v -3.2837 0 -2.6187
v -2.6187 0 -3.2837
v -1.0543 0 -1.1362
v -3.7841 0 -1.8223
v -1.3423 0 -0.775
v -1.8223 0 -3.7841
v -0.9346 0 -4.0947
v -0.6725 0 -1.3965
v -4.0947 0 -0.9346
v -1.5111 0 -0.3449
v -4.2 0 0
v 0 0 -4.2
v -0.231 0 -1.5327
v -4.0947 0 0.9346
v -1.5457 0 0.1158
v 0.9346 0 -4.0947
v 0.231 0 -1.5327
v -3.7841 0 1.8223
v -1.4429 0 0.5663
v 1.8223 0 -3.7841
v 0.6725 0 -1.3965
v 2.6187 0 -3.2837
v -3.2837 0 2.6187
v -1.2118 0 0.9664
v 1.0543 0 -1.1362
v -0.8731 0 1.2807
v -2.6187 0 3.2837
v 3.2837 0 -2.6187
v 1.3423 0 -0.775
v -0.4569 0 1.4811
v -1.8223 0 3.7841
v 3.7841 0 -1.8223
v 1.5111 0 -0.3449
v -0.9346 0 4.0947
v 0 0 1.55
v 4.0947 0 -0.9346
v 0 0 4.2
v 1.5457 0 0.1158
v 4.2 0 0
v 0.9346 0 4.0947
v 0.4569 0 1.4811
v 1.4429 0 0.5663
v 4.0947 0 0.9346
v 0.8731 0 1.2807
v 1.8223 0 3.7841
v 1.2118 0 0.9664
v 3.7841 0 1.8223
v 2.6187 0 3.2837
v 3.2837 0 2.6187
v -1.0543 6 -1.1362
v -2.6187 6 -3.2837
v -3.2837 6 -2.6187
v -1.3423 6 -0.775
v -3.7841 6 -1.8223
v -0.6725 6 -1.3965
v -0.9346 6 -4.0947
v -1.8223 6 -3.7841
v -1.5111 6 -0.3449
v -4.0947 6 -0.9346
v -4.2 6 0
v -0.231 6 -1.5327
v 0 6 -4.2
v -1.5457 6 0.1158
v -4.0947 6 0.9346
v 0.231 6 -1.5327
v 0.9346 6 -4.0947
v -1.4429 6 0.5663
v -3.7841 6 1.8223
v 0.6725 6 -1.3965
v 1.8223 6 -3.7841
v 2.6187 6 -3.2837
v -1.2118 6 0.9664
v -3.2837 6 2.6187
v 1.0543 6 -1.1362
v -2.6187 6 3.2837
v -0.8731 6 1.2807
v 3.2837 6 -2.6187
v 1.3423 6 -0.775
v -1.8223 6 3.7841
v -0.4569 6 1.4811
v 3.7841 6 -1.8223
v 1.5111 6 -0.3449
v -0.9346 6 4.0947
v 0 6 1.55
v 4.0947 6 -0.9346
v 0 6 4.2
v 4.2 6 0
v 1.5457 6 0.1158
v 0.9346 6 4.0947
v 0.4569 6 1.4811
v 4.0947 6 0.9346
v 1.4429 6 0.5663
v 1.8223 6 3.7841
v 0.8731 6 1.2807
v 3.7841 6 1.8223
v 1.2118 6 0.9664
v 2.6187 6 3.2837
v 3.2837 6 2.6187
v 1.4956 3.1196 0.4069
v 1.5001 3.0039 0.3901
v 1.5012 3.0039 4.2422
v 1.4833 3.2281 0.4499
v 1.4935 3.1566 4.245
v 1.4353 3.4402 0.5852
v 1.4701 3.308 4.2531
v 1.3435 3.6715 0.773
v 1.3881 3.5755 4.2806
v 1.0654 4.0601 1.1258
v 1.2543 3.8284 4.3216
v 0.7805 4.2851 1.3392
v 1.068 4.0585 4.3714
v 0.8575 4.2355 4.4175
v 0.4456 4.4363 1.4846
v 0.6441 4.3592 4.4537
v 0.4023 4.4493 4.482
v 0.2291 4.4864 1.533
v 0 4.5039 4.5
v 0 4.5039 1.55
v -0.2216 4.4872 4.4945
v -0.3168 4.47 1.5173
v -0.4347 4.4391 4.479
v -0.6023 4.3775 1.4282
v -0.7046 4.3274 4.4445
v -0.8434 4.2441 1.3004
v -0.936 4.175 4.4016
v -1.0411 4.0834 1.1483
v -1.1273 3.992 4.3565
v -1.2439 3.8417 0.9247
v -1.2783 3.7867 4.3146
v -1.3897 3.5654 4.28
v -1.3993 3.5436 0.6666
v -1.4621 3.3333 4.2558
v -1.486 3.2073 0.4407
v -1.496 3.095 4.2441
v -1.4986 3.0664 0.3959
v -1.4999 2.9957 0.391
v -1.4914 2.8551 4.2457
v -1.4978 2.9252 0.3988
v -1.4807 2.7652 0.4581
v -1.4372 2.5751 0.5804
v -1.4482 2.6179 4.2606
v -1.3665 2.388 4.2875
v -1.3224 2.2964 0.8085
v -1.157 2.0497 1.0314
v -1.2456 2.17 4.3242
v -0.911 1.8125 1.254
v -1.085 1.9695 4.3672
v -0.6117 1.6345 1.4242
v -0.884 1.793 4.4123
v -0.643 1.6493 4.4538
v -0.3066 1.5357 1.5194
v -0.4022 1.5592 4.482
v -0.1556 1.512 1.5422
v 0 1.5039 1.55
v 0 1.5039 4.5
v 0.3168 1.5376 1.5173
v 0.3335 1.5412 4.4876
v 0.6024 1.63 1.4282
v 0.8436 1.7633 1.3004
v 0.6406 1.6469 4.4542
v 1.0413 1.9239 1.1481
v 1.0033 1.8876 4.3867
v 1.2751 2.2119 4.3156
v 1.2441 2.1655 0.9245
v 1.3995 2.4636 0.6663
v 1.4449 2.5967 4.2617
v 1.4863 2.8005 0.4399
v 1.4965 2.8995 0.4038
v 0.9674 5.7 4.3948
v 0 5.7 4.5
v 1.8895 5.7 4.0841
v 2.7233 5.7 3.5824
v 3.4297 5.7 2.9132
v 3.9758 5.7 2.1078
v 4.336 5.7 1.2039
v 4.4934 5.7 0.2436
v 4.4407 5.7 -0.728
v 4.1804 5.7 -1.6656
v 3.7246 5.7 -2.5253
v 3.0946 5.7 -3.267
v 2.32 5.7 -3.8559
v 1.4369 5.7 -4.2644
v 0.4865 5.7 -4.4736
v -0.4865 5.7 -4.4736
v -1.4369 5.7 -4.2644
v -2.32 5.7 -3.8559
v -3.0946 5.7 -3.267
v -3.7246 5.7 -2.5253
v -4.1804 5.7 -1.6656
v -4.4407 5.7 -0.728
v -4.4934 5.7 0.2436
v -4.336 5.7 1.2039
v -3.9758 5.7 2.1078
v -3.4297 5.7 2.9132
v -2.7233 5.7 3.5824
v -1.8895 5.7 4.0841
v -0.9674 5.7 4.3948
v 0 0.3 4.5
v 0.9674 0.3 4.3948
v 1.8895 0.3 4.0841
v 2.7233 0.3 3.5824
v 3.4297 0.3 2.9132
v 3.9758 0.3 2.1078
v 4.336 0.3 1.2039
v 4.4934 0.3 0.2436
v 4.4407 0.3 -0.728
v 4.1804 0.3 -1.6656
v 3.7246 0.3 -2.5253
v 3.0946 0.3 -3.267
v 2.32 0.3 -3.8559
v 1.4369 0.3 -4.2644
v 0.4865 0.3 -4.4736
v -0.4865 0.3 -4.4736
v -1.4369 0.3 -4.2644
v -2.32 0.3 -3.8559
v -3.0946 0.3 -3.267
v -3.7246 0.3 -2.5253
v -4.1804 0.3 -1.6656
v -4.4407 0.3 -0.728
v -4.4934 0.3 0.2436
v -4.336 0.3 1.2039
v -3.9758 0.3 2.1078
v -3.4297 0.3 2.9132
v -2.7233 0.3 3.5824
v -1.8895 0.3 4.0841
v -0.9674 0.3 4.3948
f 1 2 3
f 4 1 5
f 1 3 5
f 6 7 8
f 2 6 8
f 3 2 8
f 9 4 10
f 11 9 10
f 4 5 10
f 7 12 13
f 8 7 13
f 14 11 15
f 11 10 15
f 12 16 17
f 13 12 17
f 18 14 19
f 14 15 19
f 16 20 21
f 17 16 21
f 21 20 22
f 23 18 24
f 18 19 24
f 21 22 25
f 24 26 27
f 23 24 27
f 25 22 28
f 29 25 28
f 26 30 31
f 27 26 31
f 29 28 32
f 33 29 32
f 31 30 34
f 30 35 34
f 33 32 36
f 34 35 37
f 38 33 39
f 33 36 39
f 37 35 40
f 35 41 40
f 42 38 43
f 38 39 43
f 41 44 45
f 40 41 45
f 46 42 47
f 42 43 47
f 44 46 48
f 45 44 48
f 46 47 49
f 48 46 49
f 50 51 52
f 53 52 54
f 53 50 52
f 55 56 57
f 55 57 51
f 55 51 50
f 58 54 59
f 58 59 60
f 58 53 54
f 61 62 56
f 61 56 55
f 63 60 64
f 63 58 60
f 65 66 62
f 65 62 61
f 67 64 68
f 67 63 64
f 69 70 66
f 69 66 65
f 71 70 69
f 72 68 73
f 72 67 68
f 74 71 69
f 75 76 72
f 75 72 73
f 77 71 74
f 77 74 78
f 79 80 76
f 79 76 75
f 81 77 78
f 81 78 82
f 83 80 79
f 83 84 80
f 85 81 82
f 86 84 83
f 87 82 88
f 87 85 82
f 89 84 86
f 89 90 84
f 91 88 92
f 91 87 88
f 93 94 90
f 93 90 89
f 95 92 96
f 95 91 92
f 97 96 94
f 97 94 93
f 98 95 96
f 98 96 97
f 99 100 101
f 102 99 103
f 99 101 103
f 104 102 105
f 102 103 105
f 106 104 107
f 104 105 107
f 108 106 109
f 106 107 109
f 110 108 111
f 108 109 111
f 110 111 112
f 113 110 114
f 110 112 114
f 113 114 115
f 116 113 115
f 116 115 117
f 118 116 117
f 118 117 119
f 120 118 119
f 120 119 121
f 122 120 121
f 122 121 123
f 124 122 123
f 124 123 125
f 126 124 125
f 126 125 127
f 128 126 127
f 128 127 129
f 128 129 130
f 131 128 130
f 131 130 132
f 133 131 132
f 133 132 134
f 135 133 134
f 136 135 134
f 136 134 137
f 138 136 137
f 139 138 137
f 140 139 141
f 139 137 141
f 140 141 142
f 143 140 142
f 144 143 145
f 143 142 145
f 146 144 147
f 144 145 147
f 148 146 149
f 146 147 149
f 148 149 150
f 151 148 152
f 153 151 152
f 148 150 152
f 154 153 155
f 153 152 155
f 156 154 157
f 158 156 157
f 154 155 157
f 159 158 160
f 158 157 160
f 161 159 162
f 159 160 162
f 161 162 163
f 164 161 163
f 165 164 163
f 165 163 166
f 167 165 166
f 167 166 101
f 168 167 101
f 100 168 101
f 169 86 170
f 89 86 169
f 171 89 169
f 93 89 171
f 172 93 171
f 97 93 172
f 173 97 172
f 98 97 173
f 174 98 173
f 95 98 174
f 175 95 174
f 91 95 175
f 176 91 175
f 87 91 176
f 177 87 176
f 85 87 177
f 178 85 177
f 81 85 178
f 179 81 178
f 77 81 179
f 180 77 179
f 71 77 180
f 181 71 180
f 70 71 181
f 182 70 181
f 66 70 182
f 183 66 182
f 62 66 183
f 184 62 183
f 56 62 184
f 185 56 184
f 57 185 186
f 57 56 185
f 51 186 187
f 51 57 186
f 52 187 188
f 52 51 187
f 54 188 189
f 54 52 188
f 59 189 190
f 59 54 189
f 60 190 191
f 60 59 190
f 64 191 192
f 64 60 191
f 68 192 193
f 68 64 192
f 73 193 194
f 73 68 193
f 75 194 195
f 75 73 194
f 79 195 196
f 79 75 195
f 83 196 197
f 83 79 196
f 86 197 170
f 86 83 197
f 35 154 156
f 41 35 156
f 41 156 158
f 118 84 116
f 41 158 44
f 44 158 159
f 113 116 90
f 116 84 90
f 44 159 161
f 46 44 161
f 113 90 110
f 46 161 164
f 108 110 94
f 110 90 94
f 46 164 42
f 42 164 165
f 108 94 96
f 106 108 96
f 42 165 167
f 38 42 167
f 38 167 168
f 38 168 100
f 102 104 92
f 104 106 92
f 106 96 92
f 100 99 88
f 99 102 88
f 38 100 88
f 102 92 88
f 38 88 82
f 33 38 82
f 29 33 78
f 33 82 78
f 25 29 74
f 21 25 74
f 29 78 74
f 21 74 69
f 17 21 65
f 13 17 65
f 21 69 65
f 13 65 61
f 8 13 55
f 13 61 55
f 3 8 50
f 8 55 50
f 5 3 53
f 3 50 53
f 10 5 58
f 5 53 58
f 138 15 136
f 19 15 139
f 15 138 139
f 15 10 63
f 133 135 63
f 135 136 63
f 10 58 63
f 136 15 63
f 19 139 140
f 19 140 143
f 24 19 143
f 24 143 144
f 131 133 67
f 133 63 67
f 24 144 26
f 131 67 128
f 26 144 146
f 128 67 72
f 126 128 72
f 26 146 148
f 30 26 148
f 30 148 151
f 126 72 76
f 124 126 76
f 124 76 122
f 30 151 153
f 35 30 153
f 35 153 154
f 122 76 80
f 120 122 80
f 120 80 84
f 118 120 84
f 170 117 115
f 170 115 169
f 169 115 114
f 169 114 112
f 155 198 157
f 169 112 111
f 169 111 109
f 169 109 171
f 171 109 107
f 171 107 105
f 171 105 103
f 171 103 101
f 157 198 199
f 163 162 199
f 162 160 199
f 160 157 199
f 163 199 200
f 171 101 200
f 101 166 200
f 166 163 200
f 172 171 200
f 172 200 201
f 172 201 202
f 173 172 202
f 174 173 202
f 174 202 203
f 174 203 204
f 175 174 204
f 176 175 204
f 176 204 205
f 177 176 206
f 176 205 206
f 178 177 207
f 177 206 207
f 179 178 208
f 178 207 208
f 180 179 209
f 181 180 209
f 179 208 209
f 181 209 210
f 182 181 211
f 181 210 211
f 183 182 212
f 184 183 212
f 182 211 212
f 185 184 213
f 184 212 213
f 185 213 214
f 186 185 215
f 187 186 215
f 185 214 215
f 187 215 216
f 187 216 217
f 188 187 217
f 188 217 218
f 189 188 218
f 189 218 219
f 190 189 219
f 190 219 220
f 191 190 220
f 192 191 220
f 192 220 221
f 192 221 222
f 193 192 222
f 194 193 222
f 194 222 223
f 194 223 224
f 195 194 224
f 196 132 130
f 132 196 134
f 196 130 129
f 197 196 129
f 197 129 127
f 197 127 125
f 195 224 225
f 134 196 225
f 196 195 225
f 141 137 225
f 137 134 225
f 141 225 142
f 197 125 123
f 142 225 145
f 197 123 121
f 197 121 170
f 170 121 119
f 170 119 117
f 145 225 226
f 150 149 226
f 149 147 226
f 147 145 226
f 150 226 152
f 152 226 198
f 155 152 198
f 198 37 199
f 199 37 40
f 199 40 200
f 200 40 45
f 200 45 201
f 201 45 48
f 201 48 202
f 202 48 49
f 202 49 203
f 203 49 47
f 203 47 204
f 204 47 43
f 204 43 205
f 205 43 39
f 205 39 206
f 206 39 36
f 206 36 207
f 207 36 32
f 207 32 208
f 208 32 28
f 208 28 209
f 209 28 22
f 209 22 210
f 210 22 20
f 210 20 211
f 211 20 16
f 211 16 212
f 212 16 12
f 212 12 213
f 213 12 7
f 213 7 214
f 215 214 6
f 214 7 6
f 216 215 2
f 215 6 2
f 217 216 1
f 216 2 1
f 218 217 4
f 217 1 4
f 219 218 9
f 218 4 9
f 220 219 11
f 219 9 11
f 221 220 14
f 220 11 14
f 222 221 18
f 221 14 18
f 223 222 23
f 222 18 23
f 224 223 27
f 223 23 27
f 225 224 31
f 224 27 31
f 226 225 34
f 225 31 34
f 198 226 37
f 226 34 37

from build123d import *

# Parameters (mm, degrees)
CROQUIS1_R                                     = 4.5
SALIENTE_EXTRUIR1_DEPTH                        = 6
CHAFL_N1_SIZE                                  = 0.3
CHAFL_N2_SIZE                                  = 0.3
CROQUIS2_R                                     = 1.55
CORTAR_EXTRUIR2_DEPTH                          = 6
PERFORADOR_PARA_ROSCAR_HELICOIL_DE_M2_21_REACH = 12.502
PERFORADOR_PARA_ROSCAR_HELICOIL_DE_M_2_R       = 1.5


with BuildPart() as part:
    # Croquis1 → Saliente-Extruir1 (new body)
    with BuildSketch(Plane(origin=(0, 0, 0), x_dir=(1, 0, 0), z_dir=(0, 1, 0))):
        with Locations(Location((0, 0, 0), (0, 0, 270))):
            Circle(CROQUIS1_R)
    extrude(amount=SALIENTE_EXTRUIR1_DEPTH)

    # Chaflán1
    chafl_n1_edges = [part.edges().sort_by_distance(p)[0] for p in [
        (0, 6, -4.5),
    ]]
    chamfer(chafl_n1_edges, length=CHAFL_N1_SIZE)

    # Chaflán2
    chafl_n2_edges = [part.edges().sort_by_distance(p)[0] for p in [
        (0, 0, -4.5),
    ]]
    chamfer(chafl_n2_edges, length=CHAFL_N2_SIZE)

    # Croquis2 → Cortar-Extruir2 (cut)
    with BuildSketch(Plane(origin=(0, 6, 0), x_dir=(1, 0, 0), z_dir=(0, 1, 0))):
        with Locations(Location((0, 0, 0), (0, 0, 270))):
            Circle(CROQUIS2_R)
    extrude(amount=-CORTAR_EXTRUIR2_DEPTH, mode=Mode.SUBTRACT)

    # Perforador para roscar Helicoil de M 2 (on position points) → Perforador para roscar Helicoil de M2.21 (cut, up to next)
    with BuildSketch(Plane(origin=(0.001317156, 3.003898977, 4.499999807), x_dir=(0.999999957163, 0, -0.000292701404), z_dir=(0.000292701404, 0, 0.999999957163)), mode=Mode.PRIVATE) as perforador_para_roscar_helicoil_de_m2_21_sk1:
        Circle(PERFORADOR_PARA_ROSCAR_HELICOIL_DE_M_2_R)
    perforador_para_roscar_helicoil_de_m2_21_tool1 = extrude(perforador_para_roscar_helicoil_de_m2_21_sk1.sketch, amount=-PERFORADOR_PARA_ROSCAR_HELICOIL_DE_M2_21_REACH, mode=Mode.PRIVATE) & part.part
    add(perforador_para_roscar_helicoil_de_m2_21_tool1.solids().sort_by_distance((0.001317, 3.003899, 4.5))[0], mode=Mode.SUBTRACT)


solid = part.part
